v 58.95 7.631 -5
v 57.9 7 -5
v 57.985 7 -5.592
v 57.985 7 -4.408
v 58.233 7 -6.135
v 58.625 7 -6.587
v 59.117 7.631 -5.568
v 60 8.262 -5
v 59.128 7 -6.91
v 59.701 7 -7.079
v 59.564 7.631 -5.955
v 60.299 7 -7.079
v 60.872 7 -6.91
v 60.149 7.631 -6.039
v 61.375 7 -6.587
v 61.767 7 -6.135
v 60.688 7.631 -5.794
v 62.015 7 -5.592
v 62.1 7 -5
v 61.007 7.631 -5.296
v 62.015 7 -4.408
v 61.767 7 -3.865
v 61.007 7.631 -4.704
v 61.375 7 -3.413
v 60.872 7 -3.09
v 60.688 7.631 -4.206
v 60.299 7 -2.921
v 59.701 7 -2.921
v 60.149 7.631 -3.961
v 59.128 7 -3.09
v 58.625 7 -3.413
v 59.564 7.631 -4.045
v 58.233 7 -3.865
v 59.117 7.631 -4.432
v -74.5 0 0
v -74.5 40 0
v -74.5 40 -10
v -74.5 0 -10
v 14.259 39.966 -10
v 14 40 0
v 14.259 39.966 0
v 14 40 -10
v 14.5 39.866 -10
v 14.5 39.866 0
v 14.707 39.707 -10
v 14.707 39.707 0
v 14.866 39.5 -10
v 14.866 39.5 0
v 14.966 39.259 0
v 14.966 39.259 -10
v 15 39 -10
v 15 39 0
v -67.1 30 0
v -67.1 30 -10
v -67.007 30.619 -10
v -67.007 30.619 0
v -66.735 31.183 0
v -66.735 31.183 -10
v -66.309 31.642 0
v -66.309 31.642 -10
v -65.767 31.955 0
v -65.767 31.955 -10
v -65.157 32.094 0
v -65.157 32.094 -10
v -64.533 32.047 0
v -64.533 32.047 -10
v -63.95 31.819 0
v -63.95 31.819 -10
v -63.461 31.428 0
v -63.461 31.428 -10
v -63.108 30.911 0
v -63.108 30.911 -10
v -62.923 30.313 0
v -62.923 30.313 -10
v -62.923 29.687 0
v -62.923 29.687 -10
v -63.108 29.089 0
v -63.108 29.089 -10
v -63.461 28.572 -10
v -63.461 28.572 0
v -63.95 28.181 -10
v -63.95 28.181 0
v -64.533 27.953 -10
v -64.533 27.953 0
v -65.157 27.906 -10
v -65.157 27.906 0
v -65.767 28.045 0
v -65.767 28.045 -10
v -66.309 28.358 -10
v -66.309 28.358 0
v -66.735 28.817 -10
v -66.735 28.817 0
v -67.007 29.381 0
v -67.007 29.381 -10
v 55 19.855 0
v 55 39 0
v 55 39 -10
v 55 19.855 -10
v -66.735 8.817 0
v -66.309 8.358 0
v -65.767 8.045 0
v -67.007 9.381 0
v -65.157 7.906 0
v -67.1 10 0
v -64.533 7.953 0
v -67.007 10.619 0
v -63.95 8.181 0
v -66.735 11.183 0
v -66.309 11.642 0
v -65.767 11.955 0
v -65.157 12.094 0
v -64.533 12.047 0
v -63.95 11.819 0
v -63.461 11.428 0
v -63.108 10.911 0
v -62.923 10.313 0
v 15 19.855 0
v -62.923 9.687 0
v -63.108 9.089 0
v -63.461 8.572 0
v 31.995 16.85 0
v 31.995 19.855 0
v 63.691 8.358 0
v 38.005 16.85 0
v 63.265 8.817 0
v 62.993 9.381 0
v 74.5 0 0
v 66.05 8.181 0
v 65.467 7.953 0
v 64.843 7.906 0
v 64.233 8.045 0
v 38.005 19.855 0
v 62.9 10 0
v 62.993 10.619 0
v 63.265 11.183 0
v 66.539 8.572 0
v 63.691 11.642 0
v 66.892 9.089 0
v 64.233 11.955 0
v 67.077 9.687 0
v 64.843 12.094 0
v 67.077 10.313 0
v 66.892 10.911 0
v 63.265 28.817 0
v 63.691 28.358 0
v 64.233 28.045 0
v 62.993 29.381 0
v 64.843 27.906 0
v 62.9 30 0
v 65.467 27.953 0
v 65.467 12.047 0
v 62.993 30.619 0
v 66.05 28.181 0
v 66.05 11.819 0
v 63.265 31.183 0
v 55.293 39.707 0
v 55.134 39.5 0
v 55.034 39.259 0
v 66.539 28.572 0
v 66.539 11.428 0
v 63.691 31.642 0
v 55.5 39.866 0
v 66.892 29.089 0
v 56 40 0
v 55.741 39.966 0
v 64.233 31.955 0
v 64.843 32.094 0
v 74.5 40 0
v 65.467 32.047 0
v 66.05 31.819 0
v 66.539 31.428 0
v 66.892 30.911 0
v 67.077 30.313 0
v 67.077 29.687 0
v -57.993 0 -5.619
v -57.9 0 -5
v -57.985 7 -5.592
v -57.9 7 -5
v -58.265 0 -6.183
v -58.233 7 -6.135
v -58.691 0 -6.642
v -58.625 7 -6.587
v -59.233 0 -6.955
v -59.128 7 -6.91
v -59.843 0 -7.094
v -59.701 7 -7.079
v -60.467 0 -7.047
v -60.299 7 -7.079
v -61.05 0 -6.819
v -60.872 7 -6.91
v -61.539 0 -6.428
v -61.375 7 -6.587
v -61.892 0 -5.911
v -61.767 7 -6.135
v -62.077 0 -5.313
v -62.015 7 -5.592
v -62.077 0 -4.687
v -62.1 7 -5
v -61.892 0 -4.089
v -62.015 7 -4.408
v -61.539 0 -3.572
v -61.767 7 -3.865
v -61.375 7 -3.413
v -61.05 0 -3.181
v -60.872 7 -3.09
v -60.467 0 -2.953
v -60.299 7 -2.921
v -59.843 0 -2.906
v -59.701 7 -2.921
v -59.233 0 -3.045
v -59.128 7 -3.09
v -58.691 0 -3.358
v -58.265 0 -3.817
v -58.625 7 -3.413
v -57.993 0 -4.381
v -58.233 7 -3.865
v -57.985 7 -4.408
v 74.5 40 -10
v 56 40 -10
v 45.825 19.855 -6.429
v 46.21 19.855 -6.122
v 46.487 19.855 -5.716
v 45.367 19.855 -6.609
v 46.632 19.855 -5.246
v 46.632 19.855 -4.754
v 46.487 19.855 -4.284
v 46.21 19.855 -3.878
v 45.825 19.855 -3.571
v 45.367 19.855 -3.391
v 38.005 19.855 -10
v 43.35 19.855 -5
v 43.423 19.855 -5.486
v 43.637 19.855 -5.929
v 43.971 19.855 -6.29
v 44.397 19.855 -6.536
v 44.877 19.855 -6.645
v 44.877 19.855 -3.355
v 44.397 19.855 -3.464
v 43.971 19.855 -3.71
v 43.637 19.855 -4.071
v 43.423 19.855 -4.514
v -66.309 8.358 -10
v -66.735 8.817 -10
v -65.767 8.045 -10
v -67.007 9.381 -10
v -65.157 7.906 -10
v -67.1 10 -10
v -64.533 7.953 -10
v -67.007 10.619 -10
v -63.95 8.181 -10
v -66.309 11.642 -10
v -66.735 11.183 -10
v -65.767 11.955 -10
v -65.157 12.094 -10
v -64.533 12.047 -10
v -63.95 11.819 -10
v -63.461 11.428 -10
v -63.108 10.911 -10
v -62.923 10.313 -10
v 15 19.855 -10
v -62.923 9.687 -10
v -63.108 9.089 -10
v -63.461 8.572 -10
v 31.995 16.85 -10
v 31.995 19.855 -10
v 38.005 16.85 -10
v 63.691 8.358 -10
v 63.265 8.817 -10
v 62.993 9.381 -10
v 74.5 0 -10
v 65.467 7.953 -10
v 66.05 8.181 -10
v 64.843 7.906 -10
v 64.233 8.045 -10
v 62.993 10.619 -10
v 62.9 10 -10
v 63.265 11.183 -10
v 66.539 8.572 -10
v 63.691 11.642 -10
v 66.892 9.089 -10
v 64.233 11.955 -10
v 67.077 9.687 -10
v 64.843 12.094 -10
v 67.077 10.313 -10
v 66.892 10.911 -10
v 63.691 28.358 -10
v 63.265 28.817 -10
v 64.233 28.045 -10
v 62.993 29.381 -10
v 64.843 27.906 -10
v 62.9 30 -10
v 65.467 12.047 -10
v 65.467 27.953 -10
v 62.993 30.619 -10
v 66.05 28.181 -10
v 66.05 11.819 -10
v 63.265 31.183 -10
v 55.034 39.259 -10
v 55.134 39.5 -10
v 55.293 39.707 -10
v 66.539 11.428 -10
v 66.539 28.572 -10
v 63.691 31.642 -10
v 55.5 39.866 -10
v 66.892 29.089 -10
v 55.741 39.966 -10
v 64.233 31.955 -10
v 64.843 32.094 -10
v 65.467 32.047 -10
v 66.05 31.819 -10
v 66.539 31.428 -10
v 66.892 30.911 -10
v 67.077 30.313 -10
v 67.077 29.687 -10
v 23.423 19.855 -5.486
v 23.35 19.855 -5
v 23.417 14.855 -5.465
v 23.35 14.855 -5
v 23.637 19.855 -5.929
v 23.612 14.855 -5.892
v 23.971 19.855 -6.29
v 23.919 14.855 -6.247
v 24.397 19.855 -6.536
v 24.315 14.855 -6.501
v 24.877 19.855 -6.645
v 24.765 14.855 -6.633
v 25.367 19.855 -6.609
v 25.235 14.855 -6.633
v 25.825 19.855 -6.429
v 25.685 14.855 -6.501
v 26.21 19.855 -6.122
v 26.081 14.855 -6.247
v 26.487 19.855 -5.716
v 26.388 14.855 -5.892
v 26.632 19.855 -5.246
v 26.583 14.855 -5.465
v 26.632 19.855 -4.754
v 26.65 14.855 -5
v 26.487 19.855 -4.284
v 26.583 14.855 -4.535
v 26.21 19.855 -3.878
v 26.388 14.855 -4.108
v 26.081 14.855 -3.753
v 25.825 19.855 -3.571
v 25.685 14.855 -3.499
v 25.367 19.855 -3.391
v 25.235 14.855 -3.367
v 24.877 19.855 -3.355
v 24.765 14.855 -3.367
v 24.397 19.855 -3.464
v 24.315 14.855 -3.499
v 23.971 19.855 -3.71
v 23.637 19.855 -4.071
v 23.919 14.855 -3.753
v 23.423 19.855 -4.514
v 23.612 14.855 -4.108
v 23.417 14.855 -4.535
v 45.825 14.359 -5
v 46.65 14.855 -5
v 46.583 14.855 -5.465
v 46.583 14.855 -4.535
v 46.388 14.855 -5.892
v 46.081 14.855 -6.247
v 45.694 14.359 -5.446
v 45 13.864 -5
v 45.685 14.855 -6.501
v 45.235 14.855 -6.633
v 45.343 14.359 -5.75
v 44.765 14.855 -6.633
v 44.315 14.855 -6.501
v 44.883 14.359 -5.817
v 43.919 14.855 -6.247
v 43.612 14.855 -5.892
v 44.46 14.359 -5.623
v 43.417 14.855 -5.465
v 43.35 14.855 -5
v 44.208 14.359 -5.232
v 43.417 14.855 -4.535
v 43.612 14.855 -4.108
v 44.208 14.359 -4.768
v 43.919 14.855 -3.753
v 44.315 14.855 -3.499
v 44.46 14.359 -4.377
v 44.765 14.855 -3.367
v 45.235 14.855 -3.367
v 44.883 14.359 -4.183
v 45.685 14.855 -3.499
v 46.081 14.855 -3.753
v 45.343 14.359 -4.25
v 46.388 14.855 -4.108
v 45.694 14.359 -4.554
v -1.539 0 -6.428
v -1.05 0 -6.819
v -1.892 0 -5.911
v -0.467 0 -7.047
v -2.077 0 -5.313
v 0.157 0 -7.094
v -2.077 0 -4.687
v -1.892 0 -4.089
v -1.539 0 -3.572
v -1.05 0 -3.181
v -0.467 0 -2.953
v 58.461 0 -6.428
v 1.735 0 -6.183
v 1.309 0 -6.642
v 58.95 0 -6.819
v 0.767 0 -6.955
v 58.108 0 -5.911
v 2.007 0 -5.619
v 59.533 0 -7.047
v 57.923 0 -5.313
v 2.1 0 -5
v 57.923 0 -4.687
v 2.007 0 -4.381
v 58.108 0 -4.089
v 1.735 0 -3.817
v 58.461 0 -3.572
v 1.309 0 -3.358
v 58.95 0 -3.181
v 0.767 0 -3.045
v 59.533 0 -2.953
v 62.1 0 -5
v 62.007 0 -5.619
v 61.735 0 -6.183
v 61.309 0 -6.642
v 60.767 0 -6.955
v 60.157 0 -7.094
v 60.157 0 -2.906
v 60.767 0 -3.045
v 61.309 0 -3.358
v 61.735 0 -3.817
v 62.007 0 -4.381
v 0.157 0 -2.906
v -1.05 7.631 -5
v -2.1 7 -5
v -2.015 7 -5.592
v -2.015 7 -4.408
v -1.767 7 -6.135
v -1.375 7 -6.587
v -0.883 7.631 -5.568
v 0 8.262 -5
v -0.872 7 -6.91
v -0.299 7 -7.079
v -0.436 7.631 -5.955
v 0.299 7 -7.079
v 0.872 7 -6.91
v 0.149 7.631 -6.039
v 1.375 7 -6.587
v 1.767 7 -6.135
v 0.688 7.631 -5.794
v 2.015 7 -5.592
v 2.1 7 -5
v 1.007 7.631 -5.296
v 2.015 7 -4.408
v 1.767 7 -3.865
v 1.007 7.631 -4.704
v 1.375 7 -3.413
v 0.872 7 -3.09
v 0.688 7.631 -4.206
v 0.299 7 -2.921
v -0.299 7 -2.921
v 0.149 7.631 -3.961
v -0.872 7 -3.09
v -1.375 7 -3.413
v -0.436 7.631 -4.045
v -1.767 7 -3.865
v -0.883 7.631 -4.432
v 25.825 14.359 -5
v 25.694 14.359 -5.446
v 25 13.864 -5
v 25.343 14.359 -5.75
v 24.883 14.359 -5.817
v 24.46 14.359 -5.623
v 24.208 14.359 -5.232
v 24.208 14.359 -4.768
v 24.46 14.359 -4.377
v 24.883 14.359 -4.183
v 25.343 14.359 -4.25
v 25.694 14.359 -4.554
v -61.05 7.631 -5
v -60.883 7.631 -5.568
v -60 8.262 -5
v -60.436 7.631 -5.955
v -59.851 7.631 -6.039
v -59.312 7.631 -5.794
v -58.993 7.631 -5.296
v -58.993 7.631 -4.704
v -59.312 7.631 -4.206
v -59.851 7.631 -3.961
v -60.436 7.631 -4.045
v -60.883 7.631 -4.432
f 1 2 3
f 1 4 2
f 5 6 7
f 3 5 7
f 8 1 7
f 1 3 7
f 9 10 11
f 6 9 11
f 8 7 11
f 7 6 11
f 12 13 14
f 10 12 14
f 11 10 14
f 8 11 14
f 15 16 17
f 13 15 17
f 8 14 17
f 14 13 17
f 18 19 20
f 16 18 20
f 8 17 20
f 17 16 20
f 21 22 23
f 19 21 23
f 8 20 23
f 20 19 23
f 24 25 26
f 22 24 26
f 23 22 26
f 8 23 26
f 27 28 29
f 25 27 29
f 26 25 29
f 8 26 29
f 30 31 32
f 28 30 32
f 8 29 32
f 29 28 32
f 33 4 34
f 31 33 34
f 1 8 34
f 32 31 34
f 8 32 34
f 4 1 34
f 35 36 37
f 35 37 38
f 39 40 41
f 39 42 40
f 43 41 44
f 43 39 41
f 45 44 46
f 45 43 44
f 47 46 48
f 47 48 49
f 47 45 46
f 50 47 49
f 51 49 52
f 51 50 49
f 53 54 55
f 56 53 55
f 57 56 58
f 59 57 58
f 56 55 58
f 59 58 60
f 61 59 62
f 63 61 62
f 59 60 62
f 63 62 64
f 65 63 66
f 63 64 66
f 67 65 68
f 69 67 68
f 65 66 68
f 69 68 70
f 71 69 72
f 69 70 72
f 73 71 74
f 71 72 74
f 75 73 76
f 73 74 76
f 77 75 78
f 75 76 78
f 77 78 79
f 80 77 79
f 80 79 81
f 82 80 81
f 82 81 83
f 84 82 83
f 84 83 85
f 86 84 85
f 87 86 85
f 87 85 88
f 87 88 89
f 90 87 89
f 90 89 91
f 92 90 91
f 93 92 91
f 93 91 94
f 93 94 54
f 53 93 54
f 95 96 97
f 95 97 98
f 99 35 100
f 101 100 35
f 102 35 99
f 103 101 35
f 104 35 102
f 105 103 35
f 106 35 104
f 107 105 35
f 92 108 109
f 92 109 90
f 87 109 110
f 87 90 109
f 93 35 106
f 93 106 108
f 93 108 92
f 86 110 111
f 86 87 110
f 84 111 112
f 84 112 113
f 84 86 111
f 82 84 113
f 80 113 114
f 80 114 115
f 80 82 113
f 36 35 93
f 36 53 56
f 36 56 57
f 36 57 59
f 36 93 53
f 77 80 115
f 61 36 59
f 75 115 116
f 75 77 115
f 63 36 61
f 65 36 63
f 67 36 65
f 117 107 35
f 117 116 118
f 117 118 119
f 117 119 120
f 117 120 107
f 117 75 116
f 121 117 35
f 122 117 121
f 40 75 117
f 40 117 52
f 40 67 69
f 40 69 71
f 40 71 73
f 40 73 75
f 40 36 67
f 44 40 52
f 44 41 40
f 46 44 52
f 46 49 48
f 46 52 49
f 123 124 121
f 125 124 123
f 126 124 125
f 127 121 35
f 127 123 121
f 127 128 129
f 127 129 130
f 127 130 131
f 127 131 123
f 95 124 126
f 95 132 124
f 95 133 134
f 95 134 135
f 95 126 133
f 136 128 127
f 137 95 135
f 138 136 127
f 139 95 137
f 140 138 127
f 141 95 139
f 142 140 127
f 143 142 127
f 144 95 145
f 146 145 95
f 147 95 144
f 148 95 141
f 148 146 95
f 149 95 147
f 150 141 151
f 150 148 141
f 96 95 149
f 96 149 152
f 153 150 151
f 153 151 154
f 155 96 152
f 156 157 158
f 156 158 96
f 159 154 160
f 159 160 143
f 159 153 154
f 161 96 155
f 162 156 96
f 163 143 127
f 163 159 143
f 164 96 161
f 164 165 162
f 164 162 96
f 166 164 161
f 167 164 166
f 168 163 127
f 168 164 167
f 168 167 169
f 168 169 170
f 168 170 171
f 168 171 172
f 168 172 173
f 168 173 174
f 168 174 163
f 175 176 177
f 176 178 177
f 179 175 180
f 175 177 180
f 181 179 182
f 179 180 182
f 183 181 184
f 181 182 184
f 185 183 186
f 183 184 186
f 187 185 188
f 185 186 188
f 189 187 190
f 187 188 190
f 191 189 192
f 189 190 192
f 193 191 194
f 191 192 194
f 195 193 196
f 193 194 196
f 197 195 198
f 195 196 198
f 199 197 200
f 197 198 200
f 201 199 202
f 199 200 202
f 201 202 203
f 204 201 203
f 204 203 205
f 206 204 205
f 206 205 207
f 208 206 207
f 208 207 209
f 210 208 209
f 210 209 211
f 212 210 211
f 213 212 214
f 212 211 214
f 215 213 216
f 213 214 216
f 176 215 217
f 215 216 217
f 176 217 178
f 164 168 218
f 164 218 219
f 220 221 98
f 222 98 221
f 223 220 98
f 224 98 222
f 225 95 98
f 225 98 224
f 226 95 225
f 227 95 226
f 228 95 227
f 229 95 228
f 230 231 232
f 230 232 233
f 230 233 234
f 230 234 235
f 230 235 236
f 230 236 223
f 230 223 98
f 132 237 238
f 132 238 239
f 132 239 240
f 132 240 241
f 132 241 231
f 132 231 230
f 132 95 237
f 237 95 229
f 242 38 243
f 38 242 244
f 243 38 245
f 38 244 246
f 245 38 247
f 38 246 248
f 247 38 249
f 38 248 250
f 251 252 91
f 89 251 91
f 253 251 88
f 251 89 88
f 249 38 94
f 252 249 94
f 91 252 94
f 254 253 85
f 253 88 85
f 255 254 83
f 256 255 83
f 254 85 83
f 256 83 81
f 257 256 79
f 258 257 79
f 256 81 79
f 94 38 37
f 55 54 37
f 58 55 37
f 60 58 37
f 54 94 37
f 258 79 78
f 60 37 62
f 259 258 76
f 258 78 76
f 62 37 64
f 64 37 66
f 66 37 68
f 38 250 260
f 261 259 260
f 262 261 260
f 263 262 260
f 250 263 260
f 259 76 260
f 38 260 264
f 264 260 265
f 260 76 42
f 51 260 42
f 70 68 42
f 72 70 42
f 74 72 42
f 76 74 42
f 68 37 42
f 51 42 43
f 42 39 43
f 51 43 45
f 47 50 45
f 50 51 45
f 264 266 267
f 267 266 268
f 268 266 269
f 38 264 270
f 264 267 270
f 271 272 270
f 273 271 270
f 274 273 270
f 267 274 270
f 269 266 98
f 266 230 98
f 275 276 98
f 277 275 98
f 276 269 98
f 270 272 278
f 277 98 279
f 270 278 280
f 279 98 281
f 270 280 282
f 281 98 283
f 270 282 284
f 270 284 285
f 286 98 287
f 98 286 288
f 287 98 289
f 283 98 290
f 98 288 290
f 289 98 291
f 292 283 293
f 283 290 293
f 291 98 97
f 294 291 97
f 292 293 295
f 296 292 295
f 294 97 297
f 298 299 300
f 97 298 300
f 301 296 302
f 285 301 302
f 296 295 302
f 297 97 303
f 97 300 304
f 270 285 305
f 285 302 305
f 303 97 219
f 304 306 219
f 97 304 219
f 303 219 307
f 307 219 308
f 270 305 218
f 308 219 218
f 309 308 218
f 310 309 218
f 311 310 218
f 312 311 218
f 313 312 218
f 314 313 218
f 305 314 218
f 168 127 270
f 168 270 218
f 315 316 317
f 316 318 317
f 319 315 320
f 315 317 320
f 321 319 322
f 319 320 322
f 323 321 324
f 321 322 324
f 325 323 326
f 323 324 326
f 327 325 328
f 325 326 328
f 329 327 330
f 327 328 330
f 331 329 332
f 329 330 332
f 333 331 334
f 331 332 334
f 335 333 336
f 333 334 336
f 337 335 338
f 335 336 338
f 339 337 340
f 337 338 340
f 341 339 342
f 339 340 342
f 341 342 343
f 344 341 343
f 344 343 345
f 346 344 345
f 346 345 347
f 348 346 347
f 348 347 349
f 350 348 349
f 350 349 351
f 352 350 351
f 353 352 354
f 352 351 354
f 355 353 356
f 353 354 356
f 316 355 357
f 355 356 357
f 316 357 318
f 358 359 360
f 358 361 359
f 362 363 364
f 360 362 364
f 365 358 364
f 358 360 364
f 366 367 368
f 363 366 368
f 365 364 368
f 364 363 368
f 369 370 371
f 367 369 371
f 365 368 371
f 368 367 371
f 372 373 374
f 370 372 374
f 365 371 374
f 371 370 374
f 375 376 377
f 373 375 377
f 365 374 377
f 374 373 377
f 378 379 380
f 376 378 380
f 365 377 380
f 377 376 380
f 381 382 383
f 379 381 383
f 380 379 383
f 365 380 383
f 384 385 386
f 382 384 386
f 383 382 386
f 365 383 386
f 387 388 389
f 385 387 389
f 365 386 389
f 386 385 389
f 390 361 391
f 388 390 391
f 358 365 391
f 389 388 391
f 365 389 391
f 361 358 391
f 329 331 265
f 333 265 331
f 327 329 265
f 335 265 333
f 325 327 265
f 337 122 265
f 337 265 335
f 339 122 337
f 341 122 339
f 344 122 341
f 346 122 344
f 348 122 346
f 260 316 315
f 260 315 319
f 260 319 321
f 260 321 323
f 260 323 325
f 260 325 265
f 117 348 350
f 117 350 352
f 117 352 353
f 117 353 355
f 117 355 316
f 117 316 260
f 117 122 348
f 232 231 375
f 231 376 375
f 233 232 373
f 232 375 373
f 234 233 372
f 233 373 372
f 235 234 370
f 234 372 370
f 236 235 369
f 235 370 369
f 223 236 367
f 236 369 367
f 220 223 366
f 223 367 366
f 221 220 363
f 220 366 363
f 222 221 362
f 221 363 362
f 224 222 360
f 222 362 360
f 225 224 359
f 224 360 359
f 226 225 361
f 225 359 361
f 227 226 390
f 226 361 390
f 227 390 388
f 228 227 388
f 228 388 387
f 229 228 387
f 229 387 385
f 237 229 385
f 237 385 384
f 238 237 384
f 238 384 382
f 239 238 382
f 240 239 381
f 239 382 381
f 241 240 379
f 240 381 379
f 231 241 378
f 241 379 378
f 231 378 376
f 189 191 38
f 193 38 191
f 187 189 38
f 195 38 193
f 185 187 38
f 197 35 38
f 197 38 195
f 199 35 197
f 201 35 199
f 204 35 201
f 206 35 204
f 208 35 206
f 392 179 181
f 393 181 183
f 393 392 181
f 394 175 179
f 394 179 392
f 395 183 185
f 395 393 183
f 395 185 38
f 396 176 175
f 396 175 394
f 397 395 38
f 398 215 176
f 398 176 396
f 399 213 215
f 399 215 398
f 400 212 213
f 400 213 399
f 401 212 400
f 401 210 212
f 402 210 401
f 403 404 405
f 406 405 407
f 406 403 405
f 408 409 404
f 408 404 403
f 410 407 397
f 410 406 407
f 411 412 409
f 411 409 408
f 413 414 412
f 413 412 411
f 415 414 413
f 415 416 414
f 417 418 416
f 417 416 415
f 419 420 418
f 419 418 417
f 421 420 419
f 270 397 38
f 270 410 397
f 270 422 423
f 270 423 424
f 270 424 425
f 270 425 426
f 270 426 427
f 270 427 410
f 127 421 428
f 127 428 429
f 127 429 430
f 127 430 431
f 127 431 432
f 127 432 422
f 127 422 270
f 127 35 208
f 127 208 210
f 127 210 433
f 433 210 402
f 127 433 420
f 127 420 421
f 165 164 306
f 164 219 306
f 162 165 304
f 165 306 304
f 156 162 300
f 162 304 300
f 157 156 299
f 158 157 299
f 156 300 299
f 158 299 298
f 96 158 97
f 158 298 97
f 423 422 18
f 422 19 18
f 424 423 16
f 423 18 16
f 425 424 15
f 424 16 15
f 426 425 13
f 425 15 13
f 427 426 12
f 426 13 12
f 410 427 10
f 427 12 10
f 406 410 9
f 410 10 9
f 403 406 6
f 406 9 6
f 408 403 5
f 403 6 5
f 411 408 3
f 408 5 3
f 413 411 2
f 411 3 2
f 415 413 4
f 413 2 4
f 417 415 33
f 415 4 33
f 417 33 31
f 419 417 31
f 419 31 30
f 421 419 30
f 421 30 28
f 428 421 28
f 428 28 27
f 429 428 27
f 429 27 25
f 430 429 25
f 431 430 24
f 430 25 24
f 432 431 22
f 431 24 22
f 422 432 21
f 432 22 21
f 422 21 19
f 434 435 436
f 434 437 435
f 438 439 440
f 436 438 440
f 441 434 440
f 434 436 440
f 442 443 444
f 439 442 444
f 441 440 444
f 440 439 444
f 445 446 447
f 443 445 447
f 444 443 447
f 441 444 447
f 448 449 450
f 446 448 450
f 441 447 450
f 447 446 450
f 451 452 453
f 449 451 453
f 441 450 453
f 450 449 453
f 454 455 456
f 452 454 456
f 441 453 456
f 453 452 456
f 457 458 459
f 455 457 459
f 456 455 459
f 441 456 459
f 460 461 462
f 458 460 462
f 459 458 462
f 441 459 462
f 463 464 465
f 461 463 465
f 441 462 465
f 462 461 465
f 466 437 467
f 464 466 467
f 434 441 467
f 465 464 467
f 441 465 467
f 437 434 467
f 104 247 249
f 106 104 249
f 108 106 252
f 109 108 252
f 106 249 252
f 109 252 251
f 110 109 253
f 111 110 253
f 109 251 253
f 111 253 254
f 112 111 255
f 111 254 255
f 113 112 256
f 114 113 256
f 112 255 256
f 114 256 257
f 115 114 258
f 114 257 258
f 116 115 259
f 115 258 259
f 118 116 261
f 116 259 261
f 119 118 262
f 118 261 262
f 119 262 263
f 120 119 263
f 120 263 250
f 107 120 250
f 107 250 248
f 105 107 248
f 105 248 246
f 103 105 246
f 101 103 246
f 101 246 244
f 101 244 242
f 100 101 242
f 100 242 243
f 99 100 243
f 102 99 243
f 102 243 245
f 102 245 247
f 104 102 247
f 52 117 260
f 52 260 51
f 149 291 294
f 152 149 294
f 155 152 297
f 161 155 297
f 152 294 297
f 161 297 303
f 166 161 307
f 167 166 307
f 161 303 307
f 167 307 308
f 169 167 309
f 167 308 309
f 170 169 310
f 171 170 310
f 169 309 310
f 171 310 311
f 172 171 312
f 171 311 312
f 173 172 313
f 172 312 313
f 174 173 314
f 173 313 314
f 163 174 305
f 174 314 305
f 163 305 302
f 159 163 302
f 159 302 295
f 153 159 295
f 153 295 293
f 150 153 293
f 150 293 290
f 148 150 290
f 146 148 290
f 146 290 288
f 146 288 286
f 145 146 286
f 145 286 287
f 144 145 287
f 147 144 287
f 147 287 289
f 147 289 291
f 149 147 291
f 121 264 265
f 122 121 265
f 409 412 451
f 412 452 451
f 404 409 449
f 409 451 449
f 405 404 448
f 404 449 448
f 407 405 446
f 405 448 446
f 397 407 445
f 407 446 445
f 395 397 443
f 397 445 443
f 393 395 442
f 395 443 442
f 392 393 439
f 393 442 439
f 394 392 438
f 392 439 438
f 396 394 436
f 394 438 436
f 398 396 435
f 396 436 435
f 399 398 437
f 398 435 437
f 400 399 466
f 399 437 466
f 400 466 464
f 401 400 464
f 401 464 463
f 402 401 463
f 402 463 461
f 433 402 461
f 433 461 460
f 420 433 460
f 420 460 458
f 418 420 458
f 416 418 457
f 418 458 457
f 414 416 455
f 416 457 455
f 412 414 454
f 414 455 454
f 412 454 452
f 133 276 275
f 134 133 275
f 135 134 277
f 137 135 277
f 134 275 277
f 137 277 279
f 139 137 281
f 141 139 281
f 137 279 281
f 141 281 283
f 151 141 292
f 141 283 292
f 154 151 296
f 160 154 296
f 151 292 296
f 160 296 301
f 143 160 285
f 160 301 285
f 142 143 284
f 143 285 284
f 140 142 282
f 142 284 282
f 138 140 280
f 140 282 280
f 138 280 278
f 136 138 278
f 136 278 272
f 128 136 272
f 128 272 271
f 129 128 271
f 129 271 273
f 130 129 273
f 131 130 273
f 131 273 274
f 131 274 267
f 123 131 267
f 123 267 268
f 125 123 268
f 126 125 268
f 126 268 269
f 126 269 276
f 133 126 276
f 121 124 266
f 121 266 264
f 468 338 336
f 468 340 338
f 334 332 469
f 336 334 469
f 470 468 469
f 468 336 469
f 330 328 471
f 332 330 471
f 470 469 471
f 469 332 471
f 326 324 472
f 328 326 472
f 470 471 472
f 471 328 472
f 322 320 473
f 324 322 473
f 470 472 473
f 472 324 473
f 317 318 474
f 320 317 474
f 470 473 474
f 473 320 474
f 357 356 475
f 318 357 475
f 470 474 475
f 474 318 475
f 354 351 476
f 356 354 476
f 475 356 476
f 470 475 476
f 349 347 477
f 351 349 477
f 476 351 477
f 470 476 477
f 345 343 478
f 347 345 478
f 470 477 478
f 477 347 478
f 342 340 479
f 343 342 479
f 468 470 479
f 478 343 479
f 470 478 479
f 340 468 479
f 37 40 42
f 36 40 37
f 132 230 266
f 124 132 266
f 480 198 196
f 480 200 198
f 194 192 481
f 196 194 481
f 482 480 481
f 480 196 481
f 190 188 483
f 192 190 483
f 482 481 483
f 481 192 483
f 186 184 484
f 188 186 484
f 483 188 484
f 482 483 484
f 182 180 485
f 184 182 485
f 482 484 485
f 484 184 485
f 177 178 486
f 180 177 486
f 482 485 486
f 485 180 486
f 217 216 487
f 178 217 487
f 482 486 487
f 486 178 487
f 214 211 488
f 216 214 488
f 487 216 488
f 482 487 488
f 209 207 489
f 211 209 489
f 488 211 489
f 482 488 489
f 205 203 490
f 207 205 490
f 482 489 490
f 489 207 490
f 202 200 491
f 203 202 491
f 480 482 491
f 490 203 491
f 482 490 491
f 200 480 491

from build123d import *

# Parameters (mm, degrees)
BOSS_EXTRUDE1_DEPTH             = 10
TAP_DRILL_FOR_M4X0_7_TAP1_D     = 3.3
TAP_DRILL_FOR_M4X0_7_TAP1_DEPTH = 5
TAP_DRILL_FOR_M4X0_7_TAP1_TIP   = 0.991420021
TAP_DRILL_FOR_M5X0_8_TAP3_D     = 4.2
TAP_DRILL_FOR_M5X0_8_TAP2_D     = 4.2
TAP_DRILL_FOR_M5X0_8_TAP2_DEPTH = 7
TAP_DRILL_FOR_M5X0_8_TAP2_TIP   = 1.2618073
FILLET1_R                       = 1


with BuildPart() as part:
    # Sketch1 → Boss-Extrude1 (new body)
    with BuildSketch(Plane.XY):
        Polygon((15, 40), (-74.5, 40), (-74.5, 0), (74.5, 0), (74.5, 40), (55, 40), (55, 19.855), (38.005, 19.855), (38.005, 16.85), (31.995, 16.85), (31.995, 19.855), (15, 19.855), align=None)
    extrude(amount=-BOSS_EXTRUDE1_DEPTH)

    # Tap Drill for M4x0.7 Tap1
    with Locations(Plane(origin=(25, 19.855, -5), x_dir=(1, 0, 0), z_dir=(0, 1, 0))):
        with Locations((0, 0), (20, 0)):
            Hole(TAP_DRILL_FOR_M4X0_7_TAP1_D / 2, depth=TAP_DRILL_FOR_M4X0_7_TAP1_DEPTH)
            with Locations((0, 0, -(TAP_DRILL_FOR_M4X0_7_TAP1_DEPTH + TAP_DRILL_FOR_M4X0_7_TAP1_TIP / 2))):  # 118° drill point
                Cone(0, TAP_DRILL_FOR_M4X0_7_TAP1_D / 2, TAP_DRILL_FOR_M4X0_7_TAP1_TIP, mode=Mode.SUBTRACT)

    # Tap Drill for M5x0.8 Tap3 (through all)
    with Locations(Plane(origin=(-65, 30, 0), x_dir=(1, 0, 0), z_dir=(0, 0, 1))):
        with Locations((0, 0), (0, -20), (130, -20), (130, 0)):
            Hole(TAP_DRILL_FOR_M5X0_8_TAP3_D / 2)

    # Tap Drill for M5x0.8 Tap2
    with Locations(Plane(origin=(-60, 0, -5), x_dir=(-1, 0, 0), z_dir=(0, -1, 0))):
        with Locations((0, 0), (-60, 0), (-120, 0)):
            Hole(TAP_DRILL_FOR_M5X0_8_TAP2_D / 2, depth=TAP_DRILL_FOR_M5X0_8_TAP2_DEPTH)
            with Locations((0, 0, -(TAP_DRILL_FOR_M5X0_8_TAP2_DEPTH + TAP_DRILL_FOR_M5X0_8_TAP2_TIP / 2))):  # 118° drill point
                Cone(0, TAP_DRILL_FOR_M5X0_8_TAP2_D / 2, TAP_DRILL_FOR_M5X0_8_TAP2_TIP, mode=Mode.SUBTRACT)

    # Fillet1
    fillet1_edges = [part.edges().sort_by_distance(p)[0] for p in [
        (55, 40, -5),
        (15, 40, -5),
    ]]
    fillet(fillet1_edges, radius=FILLET1_R)


solid = part.part
